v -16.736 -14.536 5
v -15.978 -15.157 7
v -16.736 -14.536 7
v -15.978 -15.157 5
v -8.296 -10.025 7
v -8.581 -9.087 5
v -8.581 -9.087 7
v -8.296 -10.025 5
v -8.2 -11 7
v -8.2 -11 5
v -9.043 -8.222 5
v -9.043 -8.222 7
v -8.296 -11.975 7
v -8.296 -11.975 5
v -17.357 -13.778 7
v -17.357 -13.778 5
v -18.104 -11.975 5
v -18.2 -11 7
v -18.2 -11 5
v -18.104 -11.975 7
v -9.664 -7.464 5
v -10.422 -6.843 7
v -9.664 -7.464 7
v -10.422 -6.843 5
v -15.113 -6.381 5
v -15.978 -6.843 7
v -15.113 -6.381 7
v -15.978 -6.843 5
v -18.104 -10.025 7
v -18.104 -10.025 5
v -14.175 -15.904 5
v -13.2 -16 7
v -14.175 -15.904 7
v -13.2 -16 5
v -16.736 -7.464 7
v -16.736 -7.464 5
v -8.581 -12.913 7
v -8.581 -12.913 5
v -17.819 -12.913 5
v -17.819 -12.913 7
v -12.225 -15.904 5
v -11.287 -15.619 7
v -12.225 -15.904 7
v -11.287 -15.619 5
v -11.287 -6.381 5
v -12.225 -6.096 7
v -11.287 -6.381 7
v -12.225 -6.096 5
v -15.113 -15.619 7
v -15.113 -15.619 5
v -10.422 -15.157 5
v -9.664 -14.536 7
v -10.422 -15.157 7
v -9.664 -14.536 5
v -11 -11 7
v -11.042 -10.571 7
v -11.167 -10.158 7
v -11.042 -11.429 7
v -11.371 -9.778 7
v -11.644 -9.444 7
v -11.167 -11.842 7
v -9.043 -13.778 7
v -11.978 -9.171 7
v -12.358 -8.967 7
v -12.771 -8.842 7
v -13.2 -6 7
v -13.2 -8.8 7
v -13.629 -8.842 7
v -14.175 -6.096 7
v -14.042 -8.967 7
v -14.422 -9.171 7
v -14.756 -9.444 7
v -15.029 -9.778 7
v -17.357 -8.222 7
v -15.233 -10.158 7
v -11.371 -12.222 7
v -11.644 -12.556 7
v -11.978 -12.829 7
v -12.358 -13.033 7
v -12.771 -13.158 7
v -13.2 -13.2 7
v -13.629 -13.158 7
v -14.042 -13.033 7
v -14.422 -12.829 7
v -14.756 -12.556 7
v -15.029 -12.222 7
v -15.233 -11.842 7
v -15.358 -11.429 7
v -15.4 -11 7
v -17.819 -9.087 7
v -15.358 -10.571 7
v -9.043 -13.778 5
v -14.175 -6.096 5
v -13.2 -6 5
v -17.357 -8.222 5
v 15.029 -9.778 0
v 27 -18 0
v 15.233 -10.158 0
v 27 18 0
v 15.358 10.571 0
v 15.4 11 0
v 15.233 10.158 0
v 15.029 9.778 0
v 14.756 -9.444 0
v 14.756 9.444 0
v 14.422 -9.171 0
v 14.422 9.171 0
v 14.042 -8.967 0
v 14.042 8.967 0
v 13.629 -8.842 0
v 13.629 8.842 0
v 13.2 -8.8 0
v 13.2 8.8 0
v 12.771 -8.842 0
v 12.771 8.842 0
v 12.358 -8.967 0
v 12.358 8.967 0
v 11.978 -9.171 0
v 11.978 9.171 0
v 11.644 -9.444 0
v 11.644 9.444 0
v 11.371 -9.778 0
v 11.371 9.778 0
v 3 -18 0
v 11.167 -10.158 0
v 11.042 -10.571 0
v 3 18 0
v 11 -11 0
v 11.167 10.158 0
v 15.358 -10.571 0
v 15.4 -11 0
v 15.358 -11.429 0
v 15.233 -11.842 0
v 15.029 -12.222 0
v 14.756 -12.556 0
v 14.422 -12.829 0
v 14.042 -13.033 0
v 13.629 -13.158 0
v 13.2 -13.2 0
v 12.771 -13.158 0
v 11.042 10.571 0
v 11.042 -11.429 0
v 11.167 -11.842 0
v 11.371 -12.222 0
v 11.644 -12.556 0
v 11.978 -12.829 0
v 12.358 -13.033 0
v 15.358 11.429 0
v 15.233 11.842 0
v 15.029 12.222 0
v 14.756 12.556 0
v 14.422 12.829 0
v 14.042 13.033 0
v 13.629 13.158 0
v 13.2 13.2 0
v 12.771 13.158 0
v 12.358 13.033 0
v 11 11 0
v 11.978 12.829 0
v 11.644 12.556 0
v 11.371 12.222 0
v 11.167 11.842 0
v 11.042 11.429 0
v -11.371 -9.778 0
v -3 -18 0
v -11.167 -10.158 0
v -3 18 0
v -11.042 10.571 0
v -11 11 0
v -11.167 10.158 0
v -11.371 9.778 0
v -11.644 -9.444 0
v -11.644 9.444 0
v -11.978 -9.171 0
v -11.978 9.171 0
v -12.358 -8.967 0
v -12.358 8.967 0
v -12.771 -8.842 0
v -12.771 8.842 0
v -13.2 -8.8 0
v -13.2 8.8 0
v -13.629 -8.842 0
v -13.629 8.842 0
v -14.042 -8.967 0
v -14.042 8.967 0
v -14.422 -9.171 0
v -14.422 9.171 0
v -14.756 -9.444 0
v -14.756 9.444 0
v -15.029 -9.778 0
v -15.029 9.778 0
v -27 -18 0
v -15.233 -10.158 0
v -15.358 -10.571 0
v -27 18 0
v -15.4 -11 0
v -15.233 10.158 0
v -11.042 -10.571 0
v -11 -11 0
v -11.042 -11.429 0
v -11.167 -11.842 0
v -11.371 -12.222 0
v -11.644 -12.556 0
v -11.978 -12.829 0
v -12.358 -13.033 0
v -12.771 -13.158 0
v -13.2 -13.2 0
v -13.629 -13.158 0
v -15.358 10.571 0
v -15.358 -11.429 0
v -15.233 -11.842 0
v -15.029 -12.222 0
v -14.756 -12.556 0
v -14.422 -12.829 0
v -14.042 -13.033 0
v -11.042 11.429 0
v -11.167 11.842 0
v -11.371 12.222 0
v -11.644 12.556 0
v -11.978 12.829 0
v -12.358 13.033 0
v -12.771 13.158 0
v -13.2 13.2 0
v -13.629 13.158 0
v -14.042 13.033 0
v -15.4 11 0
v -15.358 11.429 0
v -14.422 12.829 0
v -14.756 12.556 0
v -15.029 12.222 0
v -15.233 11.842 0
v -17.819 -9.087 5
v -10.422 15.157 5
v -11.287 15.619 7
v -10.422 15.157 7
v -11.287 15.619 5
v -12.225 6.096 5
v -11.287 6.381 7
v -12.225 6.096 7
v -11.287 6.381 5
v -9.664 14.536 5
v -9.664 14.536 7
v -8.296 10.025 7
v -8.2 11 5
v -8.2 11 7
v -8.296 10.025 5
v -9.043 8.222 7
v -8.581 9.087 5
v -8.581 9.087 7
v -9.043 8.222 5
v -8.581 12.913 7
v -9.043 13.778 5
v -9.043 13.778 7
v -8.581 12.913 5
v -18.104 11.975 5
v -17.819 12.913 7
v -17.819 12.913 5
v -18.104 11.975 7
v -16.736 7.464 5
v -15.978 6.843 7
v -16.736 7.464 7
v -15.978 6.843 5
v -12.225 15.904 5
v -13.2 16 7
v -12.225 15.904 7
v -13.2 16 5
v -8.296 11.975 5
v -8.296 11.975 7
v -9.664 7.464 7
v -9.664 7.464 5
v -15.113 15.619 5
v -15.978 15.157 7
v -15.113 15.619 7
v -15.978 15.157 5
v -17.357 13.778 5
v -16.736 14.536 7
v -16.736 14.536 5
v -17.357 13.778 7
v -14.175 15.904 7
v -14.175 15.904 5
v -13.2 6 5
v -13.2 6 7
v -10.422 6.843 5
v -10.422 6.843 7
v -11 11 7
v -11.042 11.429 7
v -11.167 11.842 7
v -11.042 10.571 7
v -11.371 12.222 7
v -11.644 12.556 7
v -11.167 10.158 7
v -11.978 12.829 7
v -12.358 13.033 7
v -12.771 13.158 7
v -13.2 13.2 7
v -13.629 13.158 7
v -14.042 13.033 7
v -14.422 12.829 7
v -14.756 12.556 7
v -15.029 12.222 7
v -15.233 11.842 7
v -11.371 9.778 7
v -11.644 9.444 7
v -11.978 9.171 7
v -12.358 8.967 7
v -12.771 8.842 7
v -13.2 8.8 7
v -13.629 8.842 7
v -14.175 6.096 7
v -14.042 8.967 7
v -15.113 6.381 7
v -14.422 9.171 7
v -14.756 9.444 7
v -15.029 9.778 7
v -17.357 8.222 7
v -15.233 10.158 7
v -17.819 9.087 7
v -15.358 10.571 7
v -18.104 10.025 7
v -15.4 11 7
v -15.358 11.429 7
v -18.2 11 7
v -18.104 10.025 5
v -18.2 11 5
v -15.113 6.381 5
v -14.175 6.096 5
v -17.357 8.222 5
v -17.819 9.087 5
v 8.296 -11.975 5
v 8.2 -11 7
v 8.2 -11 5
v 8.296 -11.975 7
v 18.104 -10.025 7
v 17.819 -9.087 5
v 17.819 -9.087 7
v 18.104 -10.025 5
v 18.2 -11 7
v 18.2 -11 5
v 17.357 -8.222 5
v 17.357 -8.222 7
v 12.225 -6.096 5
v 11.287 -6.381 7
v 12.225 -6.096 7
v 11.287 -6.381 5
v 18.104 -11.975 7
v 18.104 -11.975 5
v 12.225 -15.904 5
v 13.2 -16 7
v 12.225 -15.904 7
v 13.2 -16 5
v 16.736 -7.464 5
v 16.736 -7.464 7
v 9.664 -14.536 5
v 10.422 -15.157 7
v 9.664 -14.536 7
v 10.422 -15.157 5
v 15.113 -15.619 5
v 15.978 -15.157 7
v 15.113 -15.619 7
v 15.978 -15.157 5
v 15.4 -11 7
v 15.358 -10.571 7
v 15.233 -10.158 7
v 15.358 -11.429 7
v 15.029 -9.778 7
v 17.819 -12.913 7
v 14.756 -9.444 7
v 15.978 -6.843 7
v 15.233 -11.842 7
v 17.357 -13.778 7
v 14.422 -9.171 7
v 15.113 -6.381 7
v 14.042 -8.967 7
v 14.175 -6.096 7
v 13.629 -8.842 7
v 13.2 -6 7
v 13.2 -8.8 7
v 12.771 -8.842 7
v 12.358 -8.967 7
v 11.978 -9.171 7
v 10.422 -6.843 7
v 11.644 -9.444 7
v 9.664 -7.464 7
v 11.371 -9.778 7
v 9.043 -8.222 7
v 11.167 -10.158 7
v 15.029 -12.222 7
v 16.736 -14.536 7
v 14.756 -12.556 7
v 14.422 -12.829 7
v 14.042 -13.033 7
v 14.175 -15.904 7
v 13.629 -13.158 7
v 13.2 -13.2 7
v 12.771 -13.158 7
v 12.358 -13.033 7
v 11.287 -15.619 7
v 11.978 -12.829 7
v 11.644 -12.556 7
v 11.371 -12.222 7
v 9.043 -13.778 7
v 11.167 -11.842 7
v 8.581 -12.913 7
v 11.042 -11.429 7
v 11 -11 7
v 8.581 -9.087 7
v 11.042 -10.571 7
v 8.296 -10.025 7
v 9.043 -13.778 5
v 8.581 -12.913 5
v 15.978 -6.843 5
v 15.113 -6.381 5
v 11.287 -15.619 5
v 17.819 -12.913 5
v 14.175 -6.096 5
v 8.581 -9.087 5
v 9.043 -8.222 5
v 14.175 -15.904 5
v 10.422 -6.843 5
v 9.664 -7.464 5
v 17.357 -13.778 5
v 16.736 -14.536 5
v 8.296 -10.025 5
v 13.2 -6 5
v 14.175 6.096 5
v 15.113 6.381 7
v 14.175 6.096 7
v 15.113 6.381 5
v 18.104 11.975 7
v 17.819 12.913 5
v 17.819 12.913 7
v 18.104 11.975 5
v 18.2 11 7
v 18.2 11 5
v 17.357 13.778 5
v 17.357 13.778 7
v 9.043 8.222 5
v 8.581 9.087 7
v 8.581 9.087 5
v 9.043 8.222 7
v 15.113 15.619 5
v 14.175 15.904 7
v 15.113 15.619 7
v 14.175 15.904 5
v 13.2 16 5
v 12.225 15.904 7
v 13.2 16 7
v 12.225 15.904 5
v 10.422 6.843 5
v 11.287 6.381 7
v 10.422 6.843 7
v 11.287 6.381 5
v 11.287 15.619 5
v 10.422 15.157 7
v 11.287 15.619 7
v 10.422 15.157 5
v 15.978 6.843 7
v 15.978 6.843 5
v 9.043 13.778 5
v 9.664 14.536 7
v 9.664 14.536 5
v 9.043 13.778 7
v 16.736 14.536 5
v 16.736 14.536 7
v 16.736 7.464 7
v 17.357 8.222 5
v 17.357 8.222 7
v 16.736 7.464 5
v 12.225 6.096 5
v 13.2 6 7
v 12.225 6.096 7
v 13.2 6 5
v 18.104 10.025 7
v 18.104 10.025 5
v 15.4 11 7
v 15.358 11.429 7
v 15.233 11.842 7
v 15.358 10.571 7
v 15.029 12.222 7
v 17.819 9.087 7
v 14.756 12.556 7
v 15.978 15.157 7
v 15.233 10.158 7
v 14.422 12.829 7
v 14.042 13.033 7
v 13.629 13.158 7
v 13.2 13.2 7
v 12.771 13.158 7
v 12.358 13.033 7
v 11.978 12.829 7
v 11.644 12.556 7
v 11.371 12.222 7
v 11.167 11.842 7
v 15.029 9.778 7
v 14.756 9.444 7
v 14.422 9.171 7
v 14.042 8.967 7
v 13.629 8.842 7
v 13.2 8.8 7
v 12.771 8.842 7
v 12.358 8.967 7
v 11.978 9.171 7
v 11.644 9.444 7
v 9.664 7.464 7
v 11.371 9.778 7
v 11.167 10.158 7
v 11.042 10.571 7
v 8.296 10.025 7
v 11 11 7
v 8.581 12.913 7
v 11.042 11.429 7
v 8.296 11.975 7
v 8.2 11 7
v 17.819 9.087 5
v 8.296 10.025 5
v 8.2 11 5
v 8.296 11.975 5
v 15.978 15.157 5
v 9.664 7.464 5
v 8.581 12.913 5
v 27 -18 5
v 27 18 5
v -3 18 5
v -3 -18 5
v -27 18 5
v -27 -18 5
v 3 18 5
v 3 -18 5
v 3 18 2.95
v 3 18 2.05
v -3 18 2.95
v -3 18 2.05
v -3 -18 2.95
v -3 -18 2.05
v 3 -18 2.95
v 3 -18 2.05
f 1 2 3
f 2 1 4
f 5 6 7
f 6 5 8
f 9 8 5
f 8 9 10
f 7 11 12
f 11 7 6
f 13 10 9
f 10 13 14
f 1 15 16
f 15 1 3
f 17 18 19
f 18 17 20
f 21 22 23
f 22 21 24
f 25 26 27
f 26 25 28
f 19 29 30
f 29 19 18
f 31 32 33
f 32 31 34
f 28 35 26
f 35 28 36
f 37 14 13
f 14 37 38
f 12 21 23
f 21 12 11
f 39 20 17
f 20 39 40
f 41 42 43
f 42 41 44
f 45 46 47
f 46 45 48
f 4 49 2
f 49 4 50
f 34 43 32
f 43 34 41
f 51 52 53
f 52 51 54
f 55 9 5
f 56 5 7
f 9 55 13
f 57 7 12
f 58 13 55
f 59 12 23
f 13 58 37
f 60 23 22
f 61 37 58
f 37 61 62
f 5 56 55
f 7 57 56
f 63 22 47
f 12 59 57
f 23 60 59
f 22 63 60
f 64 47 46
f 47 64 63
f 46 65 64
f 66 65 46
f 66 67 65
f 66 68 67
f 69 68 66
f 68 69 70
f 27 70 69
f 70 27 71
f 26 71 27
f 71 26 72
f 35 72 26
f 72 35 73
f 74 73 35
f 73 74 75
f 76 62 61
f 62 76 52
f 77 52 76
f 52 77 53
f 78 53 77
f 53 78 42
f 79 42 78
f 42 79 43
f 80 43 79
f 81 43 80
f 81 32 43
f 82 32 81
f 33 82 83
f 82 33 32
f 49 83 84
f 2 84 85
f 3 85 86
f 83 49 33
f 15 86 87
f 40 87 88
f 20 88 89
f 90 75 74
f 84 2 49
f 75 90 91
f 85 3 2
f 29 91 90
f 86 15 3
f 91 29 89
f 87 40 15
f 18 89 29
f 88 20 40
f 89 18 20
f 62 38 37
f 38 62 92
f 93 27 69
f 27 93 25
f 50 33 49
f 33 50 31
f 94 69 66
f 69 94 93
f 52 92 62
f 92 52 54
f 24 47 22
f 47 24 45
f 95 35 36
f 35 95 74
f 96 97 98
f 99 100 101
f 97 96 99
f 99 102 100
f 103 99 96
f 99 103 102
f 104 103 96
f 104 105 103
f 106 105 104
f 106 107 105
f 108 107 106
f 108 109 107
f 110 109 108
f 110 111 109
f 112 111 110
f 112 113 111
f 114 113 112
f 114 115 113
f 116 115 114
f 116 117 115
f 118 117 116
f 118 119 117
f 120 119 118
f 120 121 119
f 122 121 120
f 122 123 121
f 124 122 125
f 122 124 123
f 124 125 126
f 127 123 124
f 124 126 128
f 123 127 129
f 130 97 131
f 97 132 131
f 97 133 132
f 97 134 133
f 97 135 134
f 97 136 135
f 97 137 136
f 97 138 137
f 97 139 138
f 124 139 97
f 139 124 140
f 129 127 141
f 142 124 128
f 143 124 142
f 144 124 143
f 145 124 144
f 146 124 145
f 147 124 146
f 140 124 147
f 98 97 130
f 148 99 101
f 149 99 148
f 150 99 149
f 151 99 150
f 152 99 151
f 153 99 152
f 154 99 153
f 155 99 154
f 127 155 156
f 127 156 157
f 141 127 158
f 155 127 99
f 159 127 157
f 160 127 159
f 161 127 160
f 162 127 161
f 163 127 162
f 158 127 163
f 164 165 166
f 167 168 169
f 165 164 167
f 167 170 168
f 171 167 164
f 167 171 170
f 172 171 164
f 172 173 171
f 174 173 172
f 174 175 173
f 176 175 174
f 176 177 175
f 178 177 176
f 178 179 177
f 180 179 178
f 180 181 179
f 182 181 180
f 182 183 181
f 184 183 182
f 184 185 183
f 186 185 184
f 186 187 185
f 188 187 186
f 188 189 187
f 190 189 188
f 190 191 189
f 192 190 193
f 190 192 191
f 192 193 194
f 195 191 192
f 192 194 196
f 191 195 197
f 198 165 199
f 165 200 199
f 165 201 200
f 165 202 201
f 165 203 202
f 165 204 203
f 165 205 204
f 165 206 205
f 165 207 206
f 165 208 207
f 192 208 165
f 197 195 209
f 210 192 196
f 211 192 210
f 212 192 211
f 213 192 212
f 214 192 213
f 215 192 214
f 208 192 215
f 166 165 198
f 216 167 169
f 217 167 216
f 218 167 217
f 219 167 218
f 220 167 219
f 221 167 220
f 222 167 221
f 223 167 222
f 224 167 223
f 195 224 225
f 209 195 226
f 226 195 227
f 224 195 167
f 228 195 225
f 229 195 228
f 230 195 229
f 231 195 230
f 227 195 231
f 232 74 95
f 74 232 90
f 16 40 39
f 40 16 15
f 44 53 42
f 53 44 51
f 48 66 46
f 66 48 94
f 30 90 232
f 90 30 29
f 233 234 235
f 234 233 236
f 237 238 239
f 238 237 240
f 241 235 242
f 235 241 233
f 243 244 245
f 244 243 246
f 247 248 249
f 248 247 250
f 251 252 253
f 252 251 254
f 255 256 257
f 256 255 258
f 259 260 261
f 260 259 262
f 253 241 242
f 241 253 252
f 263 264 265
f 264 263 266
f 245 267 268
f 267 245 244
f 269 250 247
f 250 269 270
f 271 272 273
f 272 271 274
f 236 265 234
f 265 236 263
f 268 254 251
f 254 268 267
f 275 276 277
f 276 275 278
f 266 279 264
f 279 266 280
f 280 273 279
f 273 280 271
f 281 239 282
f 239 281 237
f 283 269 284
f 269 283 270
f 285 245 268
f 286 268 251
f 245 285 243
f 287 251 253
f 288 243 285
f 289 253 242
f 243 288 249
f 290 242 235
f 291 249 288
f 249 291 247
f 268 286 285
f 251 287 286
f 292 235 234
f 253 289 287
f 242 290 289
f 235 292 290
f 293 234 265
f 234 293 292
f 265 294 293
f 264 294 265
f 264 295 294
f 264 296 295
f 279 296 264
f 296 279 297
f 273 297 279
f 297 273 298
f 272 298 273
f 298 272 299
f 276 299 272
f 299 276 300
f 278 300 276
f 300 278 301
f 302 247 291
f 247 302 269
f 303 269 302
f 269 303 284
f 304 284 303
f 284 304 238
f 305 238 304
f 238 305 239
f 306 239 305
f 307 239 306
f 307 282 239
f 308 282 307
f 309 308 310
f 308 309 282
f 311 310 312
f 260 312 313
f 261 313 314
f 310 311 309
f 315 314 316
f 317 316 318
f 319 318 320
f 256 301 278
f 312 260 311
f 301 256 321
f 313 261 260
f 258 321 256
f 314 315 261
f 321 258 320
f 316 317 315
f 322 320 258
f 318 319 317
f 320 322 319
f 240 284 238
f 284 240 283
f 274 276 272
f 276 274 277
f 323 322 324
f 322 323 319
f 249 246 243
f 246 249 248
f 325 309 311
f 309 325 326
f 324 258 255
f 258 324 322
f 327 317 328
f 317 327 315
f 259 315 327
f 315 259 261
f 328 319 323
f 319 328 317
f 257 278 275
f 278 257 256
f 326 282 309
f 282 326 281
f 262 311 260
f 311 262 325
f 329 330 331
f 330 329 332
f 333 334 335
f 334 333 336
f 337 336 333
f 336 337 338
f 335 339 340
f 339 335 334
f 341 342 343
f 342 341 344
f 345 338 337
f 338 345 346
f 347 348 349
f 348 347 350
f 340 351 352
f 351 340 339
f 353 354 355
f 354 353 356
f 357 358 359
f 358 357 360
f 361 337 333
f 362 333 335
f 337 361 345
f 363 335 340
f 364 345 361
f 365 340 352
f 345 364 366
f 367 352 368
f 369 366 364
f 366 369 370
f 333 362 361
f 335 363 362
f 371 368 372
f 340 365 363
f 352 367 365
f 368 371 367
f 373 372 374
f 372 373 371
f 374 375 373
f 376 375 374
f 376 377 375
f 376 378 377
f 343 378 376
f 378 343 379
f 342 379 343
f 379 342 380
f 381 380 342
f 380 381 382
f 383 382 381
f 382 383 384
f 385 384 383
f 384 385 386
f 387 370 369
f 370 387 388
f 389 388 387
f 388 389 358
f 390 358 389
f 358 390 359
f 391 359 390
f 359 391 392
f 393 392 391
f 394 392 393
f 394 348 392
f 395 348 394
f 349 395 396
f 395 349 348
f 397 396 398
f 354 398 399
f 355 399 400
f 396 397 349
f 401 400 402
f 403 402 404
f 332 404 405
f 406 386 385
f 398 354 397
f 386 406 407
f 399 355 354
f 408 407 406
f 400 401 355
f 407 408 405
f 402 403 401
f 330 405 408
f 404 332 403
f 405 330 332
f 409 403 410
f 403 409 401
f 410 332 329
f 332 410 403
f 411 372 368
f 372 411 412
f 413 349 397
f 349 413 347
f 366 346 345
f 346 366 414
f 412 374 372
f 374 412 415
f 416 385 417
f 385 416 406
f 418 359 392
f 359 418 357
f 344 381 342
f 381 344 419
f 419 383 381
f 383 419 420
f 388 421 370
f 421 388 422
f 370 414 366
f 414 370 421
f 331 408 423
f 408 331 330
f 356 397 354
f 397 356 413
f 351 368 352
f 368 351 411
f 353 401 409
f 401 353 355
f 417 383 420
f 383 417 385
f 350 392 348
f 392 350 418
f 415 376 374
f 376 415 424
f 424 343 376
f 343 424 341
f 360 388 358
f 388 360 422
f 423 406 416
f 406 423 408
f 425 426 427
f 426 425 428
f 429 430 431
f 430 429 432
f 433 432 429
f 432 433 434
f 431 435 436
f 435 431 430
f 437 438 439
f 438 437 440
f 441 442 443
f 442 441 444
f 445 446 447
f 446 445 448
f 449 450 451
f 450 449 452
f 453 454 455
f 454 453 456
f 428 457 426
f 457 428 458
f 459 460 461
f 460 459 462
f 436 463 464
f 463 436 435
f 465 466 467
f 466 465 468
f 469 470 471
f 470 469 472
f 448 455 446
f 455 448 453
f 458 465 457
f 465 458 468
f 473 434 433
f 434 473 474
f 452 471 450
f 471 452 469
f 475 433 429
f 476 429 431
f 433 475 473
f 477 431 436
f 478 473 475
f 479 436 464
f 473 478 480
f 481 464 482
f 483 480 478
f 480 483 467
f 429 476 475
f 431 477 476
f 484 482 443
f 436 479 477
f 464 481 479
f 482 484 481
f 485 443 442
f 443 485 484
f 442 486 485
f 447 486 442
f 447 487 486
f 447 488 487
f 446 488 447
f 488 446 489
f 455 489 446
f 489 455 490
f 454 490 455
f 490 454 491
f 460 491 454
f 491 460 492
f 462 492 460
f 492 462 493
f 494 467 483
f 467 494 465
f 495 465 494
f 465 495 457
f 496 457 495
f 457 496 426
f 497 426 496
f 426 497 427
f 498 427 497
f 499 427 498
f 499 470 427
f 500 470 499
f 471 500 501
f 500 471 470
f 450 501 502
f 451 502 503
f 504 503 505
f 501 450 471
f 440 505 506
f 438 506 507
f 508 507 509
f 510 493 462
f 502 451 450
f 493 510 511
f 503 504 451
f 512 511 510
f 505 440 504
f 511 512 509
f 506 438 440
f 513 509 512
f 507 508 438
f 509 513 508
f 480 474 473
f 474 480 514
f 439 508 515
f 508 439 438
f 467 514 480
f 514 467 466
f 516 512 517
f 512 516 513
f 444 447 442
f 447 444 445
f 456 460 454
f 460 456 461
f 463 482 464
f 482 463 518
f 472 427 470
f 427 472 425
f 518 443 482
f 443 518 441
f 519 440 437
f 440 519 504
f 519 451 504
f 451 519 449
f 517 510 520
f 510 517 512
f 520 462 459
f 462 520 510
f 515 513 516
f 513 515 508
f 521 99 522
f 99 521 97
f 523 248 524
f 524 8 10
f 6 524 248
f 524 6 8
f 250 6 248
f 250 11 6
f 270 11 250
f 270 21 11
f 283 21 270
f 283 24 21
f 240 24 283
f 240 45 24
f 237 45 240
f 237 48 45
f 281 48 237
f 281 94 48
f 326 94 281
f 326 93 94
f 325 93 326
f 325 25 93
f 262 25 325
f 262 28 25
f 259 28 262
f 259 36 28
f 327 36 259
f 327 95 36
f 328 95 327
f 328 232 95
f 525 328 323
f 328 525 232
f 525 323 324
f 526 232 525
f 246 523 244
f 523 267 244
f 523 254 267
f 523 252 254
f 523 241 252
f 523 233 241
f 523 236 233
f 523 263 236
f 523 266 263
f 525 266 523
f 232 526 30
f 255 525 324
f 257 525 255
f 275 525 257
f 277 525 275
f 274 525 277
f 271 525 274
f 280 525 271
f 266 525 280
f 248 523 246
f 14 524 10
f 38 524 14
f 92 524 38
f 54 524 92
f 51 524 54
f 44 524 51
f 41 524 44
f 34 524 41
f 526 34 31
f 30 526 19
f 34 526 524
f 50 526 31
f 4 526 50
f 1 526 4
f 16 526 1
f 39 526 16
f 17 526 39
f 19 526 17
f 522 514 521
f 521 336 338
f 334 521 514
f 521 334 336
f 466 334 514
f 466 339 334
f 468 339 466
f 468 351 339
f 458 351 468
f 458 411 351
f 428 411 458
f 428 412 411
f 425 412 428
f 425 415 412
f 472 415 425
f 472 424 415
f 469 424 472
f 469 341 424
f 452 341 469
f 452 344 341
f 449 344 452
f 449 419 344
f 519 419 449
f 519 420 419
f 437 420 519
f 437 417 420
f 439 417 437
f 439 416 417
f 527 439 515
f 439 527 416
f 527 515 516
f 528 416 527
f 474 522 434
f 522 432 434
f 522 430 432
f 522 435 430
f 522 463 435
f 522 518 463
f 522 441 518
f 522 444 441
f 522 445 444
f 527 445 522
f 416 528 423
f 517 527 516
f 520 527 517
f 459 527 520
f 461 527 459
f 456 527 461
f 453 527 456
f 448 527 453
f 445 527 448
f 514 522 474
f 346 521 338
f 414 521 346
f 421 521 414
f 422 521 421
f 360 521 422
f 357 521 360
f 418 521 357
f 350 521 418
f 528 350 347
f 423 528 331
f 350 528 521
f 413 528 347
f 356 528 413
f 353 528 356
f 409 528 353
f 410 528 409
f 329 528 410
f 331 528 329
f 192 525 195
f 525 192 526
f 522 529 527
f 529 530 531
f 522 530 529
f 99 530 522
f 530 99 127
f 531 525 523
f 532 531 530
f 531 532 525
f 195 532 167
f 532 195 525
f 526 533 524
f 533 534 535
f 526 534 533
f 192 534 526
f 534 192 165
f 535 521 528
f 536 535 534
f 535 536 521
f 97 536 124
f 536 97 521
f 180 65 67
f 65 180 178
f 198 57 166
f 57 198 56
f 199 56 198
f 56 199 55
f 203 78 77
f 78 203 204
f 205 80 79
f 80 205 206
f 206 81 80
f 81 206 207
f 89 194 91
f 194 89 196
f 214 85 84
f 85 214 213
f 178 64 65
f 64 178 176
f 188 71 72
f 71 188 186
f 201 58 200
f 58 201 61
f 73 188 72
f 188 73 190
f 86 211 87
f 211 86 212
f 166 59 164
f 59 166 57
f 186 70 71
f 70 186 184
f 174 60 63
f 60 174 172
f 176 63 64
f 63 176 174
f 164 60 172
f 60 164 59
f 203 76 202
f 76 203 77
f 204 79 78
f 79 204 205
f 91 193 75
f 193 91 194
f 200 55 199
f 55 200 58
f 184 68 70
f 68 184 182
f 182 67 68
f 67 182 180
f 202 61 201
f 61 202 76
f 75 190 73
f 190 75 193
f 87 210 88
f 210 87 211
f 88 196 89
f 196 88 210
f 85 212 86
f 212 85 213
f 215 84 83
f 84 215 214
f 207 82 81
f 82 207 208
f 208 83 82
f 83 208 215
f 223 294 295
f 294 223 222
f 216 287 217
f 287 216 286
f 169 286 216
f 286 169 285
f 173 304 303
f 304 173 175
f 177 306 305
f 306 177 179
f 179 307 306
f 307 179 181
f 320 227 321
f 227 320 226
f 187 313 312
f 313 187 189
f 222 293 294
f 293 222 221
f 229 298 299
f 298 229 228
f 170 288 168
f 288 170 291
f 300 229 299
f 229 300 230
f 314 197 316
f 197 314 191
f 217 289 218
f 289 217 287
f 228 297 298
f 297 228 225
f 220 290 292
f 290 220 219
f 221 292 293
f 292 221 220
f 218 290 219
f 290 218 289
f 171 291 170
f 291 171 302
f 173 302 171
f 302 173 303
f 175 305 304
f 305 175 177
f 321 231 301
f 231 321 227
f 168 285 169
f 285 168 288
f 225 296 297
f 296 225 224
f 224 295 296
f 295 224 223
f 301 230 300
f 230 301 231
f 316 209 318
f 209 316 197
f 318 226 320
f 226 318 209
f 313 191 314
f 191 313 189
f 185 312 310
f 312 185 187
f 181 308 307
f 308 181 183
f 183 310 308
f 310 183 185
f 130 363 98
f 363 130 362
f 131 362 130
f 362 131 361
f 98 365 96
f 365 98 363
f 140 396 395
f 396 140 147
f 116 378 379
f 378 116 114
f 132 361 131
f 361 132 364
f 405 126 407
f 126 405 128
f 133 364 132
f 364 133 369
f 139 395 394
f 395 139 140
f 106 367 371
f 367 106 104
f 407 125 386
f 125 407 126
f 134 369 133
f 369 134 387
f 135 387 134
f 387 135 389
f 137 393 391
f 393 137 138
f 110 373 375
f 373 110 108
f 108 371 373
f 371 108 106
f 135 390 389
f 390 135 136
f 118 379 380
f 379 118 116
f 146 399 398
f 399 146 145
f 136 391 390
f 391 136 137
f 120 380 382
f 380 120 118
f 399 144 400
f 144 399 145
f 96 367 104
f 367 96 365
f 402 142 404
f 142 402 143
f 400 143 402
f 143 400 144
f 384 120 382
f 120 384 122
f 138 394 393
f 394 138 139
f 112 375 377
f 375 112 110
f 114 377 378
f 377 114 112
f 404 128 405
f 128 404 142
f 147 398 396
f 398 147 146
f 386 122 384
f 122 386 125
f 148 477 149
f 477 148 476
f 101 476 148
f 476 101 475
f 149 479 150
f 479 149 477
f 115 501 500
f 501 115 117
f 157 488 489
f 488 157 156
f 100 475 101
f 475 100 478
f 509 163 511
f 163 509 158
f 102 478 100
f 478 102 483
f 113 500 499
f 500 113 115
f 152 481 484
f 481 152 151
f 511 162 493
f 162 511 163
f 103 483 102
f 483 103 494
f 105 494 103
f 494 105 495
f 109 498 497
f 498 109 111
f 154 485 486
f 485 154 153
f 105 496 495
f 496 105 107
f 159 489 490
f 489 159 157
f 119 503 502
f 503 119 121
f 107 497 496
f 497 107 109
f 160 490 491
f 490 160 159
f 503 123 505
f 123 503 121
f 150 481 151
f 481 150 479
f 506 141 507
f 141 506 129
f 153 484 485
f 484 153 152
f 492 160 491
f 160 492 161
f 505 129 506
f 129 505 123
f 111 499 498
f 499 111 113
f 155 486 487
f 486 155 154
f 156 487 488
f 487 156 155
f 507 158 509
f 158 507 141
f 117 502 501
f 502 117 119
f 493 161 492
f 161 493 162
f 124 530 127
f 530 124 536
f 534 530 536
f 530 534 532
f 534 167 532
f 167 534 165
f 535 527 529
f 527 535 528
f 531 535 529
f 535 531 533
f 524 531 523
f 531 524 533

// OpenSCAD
$fn = 32;

// ----------------------------------------------------------------------
// Living hinge: 54 x 36 mm plates, 0.9 mm flexible web
// ----------------------------------------------------------------------

// --- parameters (mm) ---
plate_len = 24;           // plate length outside the web
plate_w = 36;             // plate width
thick = 5;                // plate thickness
web_half = 3;             // half width of the flex band
web_t = 0.9;              // flexible web thickness
web_z = 2.05;             // web position inside the thickness
boss_d = 10;              // screw boss diameter
boss_h = 7;               // screw boss height
boss_x = 13.2;            // screw boss distance from the web
screw_d = 4.4;            // screw hole

difference() {
  union() {
    /* one flat strip, later thinned at the middle */
    translate([-27, -18, 0]) cube([54, 36, 5]);
    /* screw bosses, sunk 0.5 mm into the plates */
    for (sx = [-13.2, 13.2]) {
      for (sy = [-11, 11]) {
        translate([sx, sy, 0]) cylinder(h = boss_h, d = boss_d);
      }
    }
  }
  /* channel from below: leaves the web on top of it */
  translate([-3, -20.5, -2.5]) cube([6, 41, 4.55]);
  /* channel from above: thins the web down to web_t */
  translate([-3, -20.5, 2.95]) cube([6, 41, 4.55]);
  /* screw holes through the bosses */
  for (sx = [-13.2, 13.2]) {
    for (sy = [-11, 11]) {
      translate([sx, sy, -2.5]) cylinder(h = boss_h + 5, d = screw_d);
    }
  }
}
